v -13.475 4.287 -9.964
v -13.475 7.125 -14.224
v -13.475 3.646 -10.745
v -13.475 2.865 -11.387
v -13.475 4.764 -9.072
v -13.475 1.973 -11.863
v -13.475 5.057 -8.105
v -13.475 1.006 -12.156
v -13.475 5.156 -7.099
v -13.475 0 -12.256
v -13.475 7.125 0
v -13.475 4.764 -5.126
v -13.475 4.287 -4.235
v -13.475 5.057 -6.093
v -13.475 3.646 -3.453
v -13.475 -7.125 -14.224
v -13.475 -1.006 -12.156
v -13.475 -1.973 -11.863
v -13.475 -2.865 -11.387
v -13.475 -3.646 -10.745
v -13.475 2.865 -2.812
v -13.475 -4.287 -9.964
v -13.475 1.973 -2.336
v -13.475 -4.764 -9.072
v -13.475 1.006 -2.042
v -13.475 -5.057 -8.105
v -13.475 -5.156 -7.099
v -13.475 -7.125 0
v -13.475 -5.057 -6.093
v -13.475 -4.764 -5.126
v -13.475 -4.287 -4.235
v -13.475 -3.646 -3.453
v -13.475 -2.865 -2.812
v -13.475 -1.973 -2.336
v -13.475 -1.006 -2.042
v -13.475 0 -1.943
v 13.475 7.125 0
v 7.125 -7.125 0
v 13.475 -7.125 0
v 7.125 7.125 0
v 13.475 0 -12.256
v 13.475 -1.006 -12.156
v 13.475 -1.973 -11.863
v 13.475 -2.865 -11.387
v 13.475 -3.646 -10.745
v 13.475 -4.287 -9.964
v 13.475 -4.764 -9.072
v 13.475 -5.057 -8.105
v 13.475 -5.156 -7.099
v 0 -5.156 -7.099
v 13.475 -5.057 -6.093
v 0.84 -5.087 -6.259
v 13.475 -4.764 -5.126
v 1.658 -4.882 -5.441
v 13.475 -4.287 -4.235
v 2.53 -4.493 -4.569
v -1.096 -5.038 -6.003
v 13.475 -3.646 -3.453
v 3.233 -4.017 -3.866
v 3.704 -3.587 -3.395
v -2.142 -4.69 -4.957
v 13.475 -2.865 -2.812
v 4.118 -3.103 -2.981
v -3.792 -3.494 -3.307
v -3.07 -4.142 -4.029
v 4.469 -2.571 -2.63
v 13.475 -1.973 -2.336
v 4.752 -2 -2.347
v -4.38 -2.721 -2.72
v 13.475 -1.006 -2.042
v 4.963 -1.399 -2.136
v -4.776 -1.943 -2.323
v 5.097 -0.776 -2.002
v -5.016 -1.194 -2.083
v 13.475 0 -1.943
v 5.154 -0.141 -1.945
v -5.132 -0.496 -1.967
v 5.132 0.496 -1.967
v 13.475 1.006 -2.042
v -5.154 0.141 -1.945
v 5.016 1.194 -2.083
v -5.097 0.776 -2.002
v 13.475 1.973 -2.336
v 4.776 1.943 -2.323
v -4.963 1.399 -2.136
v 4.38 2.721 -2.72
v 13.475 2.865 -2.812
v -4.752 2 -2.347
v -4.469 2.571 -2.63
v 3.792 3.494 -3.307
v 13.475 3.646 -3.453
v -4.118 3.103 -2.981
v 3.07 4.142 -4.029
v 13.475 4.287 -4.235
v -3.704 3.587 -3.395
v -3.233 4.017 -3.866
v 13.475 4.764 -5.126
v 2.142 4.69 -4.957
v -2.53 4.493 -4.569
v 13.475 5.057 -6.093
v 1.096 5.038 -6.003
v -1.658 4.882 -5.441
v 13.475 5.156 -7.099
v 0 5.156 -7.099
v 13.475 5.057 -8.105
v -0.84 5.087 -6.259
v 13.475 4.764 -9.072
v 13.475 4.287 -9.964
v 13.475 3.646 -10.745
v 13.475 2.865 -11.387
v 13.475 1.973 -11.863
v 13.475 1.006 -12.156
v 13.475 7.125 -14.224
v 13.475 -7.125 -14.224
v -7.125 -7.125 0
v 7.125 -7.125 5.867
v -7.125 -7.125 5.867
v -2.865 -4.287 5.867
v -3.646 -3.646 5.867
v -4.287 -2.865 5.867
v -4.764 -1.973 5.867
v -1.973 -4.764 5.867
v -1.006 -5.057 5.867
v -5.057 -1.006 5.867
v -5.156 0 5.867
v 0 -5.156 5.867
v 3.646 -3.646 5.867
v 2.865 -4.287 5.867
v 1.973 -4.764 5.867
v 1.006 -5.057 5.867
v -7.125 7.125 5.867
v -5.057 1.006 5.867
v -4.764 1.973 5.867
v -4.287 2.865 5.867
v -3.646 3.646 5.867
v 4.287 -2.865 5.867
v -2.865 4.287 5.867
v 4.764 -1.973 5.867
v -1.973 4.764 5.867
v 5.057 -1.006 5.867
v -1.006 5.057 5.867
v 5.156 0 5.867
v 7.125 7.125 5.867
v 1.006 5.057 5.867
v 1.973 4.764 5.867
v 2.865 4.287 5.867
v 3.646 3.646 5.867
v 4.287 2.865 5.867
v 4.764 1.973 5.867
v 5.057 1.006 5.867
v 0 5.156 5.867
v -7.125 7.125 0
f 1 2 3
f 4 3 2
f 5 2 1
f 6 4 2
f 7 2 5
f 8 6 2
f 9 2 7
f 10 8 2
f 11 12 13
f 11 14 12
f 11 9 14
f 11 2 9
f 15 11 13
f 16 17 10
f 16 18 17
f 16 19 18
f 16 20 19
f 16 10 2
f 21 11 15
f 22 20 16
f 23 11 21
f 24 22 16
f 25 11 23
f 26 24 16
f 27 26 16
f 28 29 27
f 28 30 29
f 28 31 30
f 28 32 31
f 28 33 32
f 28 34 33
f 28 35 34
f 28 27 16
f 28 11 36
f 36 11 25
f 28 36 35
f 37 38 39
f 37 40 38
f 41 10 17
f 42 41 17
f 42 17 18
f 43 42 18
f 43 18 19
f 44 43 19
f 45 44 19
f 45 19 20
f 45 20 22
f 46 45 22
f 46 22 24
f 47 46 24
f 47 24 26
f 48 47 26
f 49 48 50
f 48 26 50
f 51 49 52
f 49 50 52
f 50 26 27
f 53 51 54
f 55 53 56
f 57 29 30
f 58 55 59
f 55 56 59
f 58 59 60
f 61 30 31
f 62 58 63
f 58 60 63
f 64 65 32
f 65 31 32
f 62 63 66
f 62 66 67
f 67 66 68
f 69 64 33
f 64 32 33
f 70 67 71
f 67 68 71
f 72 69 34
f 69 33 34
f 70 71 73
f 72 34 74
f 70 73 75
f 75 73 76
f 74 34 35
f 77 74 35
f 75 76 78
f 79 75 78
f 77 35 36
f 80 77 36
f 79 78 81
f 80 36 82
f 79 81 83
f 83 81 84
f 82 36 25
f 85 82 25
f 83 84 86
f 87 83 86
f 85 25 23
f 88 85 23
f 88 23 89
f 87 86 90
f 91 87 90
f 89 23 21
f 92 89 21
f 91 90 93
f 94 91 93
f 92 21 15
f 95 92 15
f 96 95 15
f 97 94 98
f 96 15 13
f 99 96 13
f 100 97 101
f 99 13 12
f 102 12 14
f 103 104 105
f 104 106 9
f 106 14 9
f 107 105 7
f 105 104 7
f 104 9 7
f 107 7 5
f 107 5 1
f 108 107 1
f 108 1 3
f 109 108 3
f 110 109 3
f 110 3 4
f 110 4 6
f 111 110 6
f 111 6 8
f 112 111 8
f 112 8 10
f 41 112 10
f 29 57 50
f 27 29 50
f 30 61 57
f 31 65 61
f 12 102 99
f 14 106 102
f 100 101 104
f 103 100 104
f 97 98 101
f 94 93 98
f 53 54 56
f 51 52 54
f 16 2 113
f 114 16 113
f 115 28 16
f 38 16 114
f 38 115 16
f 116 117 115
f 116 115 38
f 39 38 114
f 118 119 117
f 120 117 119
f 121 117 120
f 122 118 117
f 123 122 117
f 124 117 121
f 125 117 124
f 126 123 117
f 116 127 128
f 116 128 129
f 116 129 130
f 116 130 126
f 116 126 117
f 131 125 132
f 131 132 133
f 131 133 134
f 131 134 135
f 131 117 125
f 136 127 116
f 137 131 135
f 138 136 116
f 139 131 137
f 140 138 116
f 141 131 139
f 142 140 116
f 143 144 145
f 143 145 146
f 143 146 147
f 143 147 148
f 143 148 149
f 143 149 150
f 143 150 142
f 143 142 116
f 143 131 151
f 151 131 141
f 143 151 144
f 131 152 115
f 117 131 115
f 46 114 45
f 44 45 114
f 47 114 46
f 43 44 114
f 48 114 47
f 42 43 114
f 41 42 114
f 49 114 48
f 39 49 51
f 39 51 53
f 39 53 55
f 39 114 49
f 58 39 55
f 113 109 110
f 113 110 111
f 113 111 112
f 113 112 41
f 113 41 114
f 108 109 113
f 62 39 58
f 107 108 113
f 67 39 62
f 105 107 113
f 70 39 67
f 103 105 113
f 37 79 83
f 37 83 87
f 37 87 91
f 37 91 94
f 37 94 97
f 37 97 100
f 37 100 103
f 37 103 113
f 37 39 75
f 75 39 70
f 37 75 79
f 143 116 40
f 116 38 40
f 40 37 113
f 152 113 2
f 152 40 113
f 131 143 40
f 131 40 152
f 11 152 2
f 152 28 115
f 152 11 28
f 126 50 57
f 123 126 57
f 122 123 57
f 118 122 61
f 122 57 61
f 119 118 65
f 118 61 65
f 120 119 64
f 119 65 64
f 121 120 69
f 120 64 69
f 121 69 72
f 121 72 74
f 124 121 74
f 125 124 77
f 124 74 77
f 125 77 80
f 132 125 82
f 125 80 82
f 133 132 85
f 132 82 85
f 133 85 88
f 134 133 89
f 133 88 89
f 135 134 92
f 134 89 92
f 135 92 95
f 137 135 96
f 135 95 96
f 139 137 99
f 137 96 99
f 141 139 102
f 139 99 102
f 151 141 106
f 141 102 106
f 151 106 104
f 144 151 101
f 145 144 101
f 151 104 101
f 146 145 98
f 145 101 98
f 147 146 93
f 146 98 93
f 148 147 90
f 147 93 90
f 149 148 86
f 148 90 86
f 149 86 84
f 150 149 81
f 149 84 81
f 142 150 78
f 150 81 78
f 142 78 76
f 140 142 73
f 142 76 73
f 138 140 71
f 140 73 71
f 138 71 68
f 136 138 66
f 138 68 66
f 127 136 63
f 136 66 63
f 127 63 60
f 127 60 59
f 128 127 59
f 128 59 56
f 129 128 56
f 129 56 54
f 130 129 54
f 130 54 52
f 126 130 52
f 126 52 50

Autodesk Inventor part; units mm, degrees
ref_plane "YZ Plane" through (0, 0, 0) normal (1, 0, 0) x (0, 1, 0)
ref_plane "XZ Plane" through (0, 0, 0) normal (0, 1, 0) x (-1, 0, 0)
ref_plane "XY Plane" through (0, 0, 0) normal (0, 0, 1) x (1, 0, 0)
sketch "Sketch1" plane through (0, 0, 0) normal (0, 0, 1) x (1, 0, 0)
  line L0 (-13.4747, -7.1247) -> (13.4747, -7.1247)
  line L1 (13.4747, -7.1247) -> (13.4747, 7.1247)
  line L2 (13.4747, 7.1247) -> (-13.4747, 7.1247)
  line L3 (-13.4747, 7.1247) -> (-13.4747, -7.1247)
  line L4 (-13.4747, -7.1247) -> (13.4747, 7.1247) construction
  line L5 (13.4747, -7.1247) -> (-13.4747, 7.1247) construction
  line L6 (-7.1247, -7.1247) -> (7.1247, -7.1247)
  line L7 (7.1247, -7.1247) -> (7.1247, 7.1247)
  line L8 (7.1247, 7.1247) -> (-7.1247, 7.1247)
  line L9 (-7.1247, 7.1247) -> (-7.1247, -7.1247)
  line L10 (-7.1247, -7.1247) -> (7.1247, 7.1247) construction
  line L11 (7.1247, -7.1247) -> (-7.1247, 7.1247) construction
  point P0 (0, 0)
  dimension "d0" = 26.9494
  dimension "d1" = 14.2494
  dimension "d2" = 14.2494
extrude "Extrusion1" add sketch "Sketch1" along normal blind 5.8674 contours L9 L2 L7 L0
extrude "Extrusion2" add sketch "Sketch1" against normal blind 14.224
sketch "Sketch2" plane through (13.4747, -7.1247, 0) normal (1, 0, 0) x (0, 0, -1)
  line L0 (0, 0) -> (0, 14.2494) construction
  line L1 (0, 0) -> (14.224, 0) construction
  line L2 (14.224, 14.2494) -> (14.224, 0) construction
  line L3 (0, 14.2494) -> (14.224, 14.2494) construction
  circle A0 centre (7.0993, 7.1247) radius 7.1247 construction
  point P0 (0, 7.1247)
hole "Hole1" at (13.4747, 0, -7.0993) direction (-1, 0, 0) diameter 10.3124 end through all
sketch "Sketch3" plane through (0, 0, 5.8674) normal (0, 0, 1) x (1, 0, 0)
  point P0 (0, 0)
  point P1 (0, 0)
hole "Hole2" at (0, 0, 5.8674) direction (0, 0, -1) diameter 10.3124 end up to surface
properties part number "PPPP" material "Brass"
